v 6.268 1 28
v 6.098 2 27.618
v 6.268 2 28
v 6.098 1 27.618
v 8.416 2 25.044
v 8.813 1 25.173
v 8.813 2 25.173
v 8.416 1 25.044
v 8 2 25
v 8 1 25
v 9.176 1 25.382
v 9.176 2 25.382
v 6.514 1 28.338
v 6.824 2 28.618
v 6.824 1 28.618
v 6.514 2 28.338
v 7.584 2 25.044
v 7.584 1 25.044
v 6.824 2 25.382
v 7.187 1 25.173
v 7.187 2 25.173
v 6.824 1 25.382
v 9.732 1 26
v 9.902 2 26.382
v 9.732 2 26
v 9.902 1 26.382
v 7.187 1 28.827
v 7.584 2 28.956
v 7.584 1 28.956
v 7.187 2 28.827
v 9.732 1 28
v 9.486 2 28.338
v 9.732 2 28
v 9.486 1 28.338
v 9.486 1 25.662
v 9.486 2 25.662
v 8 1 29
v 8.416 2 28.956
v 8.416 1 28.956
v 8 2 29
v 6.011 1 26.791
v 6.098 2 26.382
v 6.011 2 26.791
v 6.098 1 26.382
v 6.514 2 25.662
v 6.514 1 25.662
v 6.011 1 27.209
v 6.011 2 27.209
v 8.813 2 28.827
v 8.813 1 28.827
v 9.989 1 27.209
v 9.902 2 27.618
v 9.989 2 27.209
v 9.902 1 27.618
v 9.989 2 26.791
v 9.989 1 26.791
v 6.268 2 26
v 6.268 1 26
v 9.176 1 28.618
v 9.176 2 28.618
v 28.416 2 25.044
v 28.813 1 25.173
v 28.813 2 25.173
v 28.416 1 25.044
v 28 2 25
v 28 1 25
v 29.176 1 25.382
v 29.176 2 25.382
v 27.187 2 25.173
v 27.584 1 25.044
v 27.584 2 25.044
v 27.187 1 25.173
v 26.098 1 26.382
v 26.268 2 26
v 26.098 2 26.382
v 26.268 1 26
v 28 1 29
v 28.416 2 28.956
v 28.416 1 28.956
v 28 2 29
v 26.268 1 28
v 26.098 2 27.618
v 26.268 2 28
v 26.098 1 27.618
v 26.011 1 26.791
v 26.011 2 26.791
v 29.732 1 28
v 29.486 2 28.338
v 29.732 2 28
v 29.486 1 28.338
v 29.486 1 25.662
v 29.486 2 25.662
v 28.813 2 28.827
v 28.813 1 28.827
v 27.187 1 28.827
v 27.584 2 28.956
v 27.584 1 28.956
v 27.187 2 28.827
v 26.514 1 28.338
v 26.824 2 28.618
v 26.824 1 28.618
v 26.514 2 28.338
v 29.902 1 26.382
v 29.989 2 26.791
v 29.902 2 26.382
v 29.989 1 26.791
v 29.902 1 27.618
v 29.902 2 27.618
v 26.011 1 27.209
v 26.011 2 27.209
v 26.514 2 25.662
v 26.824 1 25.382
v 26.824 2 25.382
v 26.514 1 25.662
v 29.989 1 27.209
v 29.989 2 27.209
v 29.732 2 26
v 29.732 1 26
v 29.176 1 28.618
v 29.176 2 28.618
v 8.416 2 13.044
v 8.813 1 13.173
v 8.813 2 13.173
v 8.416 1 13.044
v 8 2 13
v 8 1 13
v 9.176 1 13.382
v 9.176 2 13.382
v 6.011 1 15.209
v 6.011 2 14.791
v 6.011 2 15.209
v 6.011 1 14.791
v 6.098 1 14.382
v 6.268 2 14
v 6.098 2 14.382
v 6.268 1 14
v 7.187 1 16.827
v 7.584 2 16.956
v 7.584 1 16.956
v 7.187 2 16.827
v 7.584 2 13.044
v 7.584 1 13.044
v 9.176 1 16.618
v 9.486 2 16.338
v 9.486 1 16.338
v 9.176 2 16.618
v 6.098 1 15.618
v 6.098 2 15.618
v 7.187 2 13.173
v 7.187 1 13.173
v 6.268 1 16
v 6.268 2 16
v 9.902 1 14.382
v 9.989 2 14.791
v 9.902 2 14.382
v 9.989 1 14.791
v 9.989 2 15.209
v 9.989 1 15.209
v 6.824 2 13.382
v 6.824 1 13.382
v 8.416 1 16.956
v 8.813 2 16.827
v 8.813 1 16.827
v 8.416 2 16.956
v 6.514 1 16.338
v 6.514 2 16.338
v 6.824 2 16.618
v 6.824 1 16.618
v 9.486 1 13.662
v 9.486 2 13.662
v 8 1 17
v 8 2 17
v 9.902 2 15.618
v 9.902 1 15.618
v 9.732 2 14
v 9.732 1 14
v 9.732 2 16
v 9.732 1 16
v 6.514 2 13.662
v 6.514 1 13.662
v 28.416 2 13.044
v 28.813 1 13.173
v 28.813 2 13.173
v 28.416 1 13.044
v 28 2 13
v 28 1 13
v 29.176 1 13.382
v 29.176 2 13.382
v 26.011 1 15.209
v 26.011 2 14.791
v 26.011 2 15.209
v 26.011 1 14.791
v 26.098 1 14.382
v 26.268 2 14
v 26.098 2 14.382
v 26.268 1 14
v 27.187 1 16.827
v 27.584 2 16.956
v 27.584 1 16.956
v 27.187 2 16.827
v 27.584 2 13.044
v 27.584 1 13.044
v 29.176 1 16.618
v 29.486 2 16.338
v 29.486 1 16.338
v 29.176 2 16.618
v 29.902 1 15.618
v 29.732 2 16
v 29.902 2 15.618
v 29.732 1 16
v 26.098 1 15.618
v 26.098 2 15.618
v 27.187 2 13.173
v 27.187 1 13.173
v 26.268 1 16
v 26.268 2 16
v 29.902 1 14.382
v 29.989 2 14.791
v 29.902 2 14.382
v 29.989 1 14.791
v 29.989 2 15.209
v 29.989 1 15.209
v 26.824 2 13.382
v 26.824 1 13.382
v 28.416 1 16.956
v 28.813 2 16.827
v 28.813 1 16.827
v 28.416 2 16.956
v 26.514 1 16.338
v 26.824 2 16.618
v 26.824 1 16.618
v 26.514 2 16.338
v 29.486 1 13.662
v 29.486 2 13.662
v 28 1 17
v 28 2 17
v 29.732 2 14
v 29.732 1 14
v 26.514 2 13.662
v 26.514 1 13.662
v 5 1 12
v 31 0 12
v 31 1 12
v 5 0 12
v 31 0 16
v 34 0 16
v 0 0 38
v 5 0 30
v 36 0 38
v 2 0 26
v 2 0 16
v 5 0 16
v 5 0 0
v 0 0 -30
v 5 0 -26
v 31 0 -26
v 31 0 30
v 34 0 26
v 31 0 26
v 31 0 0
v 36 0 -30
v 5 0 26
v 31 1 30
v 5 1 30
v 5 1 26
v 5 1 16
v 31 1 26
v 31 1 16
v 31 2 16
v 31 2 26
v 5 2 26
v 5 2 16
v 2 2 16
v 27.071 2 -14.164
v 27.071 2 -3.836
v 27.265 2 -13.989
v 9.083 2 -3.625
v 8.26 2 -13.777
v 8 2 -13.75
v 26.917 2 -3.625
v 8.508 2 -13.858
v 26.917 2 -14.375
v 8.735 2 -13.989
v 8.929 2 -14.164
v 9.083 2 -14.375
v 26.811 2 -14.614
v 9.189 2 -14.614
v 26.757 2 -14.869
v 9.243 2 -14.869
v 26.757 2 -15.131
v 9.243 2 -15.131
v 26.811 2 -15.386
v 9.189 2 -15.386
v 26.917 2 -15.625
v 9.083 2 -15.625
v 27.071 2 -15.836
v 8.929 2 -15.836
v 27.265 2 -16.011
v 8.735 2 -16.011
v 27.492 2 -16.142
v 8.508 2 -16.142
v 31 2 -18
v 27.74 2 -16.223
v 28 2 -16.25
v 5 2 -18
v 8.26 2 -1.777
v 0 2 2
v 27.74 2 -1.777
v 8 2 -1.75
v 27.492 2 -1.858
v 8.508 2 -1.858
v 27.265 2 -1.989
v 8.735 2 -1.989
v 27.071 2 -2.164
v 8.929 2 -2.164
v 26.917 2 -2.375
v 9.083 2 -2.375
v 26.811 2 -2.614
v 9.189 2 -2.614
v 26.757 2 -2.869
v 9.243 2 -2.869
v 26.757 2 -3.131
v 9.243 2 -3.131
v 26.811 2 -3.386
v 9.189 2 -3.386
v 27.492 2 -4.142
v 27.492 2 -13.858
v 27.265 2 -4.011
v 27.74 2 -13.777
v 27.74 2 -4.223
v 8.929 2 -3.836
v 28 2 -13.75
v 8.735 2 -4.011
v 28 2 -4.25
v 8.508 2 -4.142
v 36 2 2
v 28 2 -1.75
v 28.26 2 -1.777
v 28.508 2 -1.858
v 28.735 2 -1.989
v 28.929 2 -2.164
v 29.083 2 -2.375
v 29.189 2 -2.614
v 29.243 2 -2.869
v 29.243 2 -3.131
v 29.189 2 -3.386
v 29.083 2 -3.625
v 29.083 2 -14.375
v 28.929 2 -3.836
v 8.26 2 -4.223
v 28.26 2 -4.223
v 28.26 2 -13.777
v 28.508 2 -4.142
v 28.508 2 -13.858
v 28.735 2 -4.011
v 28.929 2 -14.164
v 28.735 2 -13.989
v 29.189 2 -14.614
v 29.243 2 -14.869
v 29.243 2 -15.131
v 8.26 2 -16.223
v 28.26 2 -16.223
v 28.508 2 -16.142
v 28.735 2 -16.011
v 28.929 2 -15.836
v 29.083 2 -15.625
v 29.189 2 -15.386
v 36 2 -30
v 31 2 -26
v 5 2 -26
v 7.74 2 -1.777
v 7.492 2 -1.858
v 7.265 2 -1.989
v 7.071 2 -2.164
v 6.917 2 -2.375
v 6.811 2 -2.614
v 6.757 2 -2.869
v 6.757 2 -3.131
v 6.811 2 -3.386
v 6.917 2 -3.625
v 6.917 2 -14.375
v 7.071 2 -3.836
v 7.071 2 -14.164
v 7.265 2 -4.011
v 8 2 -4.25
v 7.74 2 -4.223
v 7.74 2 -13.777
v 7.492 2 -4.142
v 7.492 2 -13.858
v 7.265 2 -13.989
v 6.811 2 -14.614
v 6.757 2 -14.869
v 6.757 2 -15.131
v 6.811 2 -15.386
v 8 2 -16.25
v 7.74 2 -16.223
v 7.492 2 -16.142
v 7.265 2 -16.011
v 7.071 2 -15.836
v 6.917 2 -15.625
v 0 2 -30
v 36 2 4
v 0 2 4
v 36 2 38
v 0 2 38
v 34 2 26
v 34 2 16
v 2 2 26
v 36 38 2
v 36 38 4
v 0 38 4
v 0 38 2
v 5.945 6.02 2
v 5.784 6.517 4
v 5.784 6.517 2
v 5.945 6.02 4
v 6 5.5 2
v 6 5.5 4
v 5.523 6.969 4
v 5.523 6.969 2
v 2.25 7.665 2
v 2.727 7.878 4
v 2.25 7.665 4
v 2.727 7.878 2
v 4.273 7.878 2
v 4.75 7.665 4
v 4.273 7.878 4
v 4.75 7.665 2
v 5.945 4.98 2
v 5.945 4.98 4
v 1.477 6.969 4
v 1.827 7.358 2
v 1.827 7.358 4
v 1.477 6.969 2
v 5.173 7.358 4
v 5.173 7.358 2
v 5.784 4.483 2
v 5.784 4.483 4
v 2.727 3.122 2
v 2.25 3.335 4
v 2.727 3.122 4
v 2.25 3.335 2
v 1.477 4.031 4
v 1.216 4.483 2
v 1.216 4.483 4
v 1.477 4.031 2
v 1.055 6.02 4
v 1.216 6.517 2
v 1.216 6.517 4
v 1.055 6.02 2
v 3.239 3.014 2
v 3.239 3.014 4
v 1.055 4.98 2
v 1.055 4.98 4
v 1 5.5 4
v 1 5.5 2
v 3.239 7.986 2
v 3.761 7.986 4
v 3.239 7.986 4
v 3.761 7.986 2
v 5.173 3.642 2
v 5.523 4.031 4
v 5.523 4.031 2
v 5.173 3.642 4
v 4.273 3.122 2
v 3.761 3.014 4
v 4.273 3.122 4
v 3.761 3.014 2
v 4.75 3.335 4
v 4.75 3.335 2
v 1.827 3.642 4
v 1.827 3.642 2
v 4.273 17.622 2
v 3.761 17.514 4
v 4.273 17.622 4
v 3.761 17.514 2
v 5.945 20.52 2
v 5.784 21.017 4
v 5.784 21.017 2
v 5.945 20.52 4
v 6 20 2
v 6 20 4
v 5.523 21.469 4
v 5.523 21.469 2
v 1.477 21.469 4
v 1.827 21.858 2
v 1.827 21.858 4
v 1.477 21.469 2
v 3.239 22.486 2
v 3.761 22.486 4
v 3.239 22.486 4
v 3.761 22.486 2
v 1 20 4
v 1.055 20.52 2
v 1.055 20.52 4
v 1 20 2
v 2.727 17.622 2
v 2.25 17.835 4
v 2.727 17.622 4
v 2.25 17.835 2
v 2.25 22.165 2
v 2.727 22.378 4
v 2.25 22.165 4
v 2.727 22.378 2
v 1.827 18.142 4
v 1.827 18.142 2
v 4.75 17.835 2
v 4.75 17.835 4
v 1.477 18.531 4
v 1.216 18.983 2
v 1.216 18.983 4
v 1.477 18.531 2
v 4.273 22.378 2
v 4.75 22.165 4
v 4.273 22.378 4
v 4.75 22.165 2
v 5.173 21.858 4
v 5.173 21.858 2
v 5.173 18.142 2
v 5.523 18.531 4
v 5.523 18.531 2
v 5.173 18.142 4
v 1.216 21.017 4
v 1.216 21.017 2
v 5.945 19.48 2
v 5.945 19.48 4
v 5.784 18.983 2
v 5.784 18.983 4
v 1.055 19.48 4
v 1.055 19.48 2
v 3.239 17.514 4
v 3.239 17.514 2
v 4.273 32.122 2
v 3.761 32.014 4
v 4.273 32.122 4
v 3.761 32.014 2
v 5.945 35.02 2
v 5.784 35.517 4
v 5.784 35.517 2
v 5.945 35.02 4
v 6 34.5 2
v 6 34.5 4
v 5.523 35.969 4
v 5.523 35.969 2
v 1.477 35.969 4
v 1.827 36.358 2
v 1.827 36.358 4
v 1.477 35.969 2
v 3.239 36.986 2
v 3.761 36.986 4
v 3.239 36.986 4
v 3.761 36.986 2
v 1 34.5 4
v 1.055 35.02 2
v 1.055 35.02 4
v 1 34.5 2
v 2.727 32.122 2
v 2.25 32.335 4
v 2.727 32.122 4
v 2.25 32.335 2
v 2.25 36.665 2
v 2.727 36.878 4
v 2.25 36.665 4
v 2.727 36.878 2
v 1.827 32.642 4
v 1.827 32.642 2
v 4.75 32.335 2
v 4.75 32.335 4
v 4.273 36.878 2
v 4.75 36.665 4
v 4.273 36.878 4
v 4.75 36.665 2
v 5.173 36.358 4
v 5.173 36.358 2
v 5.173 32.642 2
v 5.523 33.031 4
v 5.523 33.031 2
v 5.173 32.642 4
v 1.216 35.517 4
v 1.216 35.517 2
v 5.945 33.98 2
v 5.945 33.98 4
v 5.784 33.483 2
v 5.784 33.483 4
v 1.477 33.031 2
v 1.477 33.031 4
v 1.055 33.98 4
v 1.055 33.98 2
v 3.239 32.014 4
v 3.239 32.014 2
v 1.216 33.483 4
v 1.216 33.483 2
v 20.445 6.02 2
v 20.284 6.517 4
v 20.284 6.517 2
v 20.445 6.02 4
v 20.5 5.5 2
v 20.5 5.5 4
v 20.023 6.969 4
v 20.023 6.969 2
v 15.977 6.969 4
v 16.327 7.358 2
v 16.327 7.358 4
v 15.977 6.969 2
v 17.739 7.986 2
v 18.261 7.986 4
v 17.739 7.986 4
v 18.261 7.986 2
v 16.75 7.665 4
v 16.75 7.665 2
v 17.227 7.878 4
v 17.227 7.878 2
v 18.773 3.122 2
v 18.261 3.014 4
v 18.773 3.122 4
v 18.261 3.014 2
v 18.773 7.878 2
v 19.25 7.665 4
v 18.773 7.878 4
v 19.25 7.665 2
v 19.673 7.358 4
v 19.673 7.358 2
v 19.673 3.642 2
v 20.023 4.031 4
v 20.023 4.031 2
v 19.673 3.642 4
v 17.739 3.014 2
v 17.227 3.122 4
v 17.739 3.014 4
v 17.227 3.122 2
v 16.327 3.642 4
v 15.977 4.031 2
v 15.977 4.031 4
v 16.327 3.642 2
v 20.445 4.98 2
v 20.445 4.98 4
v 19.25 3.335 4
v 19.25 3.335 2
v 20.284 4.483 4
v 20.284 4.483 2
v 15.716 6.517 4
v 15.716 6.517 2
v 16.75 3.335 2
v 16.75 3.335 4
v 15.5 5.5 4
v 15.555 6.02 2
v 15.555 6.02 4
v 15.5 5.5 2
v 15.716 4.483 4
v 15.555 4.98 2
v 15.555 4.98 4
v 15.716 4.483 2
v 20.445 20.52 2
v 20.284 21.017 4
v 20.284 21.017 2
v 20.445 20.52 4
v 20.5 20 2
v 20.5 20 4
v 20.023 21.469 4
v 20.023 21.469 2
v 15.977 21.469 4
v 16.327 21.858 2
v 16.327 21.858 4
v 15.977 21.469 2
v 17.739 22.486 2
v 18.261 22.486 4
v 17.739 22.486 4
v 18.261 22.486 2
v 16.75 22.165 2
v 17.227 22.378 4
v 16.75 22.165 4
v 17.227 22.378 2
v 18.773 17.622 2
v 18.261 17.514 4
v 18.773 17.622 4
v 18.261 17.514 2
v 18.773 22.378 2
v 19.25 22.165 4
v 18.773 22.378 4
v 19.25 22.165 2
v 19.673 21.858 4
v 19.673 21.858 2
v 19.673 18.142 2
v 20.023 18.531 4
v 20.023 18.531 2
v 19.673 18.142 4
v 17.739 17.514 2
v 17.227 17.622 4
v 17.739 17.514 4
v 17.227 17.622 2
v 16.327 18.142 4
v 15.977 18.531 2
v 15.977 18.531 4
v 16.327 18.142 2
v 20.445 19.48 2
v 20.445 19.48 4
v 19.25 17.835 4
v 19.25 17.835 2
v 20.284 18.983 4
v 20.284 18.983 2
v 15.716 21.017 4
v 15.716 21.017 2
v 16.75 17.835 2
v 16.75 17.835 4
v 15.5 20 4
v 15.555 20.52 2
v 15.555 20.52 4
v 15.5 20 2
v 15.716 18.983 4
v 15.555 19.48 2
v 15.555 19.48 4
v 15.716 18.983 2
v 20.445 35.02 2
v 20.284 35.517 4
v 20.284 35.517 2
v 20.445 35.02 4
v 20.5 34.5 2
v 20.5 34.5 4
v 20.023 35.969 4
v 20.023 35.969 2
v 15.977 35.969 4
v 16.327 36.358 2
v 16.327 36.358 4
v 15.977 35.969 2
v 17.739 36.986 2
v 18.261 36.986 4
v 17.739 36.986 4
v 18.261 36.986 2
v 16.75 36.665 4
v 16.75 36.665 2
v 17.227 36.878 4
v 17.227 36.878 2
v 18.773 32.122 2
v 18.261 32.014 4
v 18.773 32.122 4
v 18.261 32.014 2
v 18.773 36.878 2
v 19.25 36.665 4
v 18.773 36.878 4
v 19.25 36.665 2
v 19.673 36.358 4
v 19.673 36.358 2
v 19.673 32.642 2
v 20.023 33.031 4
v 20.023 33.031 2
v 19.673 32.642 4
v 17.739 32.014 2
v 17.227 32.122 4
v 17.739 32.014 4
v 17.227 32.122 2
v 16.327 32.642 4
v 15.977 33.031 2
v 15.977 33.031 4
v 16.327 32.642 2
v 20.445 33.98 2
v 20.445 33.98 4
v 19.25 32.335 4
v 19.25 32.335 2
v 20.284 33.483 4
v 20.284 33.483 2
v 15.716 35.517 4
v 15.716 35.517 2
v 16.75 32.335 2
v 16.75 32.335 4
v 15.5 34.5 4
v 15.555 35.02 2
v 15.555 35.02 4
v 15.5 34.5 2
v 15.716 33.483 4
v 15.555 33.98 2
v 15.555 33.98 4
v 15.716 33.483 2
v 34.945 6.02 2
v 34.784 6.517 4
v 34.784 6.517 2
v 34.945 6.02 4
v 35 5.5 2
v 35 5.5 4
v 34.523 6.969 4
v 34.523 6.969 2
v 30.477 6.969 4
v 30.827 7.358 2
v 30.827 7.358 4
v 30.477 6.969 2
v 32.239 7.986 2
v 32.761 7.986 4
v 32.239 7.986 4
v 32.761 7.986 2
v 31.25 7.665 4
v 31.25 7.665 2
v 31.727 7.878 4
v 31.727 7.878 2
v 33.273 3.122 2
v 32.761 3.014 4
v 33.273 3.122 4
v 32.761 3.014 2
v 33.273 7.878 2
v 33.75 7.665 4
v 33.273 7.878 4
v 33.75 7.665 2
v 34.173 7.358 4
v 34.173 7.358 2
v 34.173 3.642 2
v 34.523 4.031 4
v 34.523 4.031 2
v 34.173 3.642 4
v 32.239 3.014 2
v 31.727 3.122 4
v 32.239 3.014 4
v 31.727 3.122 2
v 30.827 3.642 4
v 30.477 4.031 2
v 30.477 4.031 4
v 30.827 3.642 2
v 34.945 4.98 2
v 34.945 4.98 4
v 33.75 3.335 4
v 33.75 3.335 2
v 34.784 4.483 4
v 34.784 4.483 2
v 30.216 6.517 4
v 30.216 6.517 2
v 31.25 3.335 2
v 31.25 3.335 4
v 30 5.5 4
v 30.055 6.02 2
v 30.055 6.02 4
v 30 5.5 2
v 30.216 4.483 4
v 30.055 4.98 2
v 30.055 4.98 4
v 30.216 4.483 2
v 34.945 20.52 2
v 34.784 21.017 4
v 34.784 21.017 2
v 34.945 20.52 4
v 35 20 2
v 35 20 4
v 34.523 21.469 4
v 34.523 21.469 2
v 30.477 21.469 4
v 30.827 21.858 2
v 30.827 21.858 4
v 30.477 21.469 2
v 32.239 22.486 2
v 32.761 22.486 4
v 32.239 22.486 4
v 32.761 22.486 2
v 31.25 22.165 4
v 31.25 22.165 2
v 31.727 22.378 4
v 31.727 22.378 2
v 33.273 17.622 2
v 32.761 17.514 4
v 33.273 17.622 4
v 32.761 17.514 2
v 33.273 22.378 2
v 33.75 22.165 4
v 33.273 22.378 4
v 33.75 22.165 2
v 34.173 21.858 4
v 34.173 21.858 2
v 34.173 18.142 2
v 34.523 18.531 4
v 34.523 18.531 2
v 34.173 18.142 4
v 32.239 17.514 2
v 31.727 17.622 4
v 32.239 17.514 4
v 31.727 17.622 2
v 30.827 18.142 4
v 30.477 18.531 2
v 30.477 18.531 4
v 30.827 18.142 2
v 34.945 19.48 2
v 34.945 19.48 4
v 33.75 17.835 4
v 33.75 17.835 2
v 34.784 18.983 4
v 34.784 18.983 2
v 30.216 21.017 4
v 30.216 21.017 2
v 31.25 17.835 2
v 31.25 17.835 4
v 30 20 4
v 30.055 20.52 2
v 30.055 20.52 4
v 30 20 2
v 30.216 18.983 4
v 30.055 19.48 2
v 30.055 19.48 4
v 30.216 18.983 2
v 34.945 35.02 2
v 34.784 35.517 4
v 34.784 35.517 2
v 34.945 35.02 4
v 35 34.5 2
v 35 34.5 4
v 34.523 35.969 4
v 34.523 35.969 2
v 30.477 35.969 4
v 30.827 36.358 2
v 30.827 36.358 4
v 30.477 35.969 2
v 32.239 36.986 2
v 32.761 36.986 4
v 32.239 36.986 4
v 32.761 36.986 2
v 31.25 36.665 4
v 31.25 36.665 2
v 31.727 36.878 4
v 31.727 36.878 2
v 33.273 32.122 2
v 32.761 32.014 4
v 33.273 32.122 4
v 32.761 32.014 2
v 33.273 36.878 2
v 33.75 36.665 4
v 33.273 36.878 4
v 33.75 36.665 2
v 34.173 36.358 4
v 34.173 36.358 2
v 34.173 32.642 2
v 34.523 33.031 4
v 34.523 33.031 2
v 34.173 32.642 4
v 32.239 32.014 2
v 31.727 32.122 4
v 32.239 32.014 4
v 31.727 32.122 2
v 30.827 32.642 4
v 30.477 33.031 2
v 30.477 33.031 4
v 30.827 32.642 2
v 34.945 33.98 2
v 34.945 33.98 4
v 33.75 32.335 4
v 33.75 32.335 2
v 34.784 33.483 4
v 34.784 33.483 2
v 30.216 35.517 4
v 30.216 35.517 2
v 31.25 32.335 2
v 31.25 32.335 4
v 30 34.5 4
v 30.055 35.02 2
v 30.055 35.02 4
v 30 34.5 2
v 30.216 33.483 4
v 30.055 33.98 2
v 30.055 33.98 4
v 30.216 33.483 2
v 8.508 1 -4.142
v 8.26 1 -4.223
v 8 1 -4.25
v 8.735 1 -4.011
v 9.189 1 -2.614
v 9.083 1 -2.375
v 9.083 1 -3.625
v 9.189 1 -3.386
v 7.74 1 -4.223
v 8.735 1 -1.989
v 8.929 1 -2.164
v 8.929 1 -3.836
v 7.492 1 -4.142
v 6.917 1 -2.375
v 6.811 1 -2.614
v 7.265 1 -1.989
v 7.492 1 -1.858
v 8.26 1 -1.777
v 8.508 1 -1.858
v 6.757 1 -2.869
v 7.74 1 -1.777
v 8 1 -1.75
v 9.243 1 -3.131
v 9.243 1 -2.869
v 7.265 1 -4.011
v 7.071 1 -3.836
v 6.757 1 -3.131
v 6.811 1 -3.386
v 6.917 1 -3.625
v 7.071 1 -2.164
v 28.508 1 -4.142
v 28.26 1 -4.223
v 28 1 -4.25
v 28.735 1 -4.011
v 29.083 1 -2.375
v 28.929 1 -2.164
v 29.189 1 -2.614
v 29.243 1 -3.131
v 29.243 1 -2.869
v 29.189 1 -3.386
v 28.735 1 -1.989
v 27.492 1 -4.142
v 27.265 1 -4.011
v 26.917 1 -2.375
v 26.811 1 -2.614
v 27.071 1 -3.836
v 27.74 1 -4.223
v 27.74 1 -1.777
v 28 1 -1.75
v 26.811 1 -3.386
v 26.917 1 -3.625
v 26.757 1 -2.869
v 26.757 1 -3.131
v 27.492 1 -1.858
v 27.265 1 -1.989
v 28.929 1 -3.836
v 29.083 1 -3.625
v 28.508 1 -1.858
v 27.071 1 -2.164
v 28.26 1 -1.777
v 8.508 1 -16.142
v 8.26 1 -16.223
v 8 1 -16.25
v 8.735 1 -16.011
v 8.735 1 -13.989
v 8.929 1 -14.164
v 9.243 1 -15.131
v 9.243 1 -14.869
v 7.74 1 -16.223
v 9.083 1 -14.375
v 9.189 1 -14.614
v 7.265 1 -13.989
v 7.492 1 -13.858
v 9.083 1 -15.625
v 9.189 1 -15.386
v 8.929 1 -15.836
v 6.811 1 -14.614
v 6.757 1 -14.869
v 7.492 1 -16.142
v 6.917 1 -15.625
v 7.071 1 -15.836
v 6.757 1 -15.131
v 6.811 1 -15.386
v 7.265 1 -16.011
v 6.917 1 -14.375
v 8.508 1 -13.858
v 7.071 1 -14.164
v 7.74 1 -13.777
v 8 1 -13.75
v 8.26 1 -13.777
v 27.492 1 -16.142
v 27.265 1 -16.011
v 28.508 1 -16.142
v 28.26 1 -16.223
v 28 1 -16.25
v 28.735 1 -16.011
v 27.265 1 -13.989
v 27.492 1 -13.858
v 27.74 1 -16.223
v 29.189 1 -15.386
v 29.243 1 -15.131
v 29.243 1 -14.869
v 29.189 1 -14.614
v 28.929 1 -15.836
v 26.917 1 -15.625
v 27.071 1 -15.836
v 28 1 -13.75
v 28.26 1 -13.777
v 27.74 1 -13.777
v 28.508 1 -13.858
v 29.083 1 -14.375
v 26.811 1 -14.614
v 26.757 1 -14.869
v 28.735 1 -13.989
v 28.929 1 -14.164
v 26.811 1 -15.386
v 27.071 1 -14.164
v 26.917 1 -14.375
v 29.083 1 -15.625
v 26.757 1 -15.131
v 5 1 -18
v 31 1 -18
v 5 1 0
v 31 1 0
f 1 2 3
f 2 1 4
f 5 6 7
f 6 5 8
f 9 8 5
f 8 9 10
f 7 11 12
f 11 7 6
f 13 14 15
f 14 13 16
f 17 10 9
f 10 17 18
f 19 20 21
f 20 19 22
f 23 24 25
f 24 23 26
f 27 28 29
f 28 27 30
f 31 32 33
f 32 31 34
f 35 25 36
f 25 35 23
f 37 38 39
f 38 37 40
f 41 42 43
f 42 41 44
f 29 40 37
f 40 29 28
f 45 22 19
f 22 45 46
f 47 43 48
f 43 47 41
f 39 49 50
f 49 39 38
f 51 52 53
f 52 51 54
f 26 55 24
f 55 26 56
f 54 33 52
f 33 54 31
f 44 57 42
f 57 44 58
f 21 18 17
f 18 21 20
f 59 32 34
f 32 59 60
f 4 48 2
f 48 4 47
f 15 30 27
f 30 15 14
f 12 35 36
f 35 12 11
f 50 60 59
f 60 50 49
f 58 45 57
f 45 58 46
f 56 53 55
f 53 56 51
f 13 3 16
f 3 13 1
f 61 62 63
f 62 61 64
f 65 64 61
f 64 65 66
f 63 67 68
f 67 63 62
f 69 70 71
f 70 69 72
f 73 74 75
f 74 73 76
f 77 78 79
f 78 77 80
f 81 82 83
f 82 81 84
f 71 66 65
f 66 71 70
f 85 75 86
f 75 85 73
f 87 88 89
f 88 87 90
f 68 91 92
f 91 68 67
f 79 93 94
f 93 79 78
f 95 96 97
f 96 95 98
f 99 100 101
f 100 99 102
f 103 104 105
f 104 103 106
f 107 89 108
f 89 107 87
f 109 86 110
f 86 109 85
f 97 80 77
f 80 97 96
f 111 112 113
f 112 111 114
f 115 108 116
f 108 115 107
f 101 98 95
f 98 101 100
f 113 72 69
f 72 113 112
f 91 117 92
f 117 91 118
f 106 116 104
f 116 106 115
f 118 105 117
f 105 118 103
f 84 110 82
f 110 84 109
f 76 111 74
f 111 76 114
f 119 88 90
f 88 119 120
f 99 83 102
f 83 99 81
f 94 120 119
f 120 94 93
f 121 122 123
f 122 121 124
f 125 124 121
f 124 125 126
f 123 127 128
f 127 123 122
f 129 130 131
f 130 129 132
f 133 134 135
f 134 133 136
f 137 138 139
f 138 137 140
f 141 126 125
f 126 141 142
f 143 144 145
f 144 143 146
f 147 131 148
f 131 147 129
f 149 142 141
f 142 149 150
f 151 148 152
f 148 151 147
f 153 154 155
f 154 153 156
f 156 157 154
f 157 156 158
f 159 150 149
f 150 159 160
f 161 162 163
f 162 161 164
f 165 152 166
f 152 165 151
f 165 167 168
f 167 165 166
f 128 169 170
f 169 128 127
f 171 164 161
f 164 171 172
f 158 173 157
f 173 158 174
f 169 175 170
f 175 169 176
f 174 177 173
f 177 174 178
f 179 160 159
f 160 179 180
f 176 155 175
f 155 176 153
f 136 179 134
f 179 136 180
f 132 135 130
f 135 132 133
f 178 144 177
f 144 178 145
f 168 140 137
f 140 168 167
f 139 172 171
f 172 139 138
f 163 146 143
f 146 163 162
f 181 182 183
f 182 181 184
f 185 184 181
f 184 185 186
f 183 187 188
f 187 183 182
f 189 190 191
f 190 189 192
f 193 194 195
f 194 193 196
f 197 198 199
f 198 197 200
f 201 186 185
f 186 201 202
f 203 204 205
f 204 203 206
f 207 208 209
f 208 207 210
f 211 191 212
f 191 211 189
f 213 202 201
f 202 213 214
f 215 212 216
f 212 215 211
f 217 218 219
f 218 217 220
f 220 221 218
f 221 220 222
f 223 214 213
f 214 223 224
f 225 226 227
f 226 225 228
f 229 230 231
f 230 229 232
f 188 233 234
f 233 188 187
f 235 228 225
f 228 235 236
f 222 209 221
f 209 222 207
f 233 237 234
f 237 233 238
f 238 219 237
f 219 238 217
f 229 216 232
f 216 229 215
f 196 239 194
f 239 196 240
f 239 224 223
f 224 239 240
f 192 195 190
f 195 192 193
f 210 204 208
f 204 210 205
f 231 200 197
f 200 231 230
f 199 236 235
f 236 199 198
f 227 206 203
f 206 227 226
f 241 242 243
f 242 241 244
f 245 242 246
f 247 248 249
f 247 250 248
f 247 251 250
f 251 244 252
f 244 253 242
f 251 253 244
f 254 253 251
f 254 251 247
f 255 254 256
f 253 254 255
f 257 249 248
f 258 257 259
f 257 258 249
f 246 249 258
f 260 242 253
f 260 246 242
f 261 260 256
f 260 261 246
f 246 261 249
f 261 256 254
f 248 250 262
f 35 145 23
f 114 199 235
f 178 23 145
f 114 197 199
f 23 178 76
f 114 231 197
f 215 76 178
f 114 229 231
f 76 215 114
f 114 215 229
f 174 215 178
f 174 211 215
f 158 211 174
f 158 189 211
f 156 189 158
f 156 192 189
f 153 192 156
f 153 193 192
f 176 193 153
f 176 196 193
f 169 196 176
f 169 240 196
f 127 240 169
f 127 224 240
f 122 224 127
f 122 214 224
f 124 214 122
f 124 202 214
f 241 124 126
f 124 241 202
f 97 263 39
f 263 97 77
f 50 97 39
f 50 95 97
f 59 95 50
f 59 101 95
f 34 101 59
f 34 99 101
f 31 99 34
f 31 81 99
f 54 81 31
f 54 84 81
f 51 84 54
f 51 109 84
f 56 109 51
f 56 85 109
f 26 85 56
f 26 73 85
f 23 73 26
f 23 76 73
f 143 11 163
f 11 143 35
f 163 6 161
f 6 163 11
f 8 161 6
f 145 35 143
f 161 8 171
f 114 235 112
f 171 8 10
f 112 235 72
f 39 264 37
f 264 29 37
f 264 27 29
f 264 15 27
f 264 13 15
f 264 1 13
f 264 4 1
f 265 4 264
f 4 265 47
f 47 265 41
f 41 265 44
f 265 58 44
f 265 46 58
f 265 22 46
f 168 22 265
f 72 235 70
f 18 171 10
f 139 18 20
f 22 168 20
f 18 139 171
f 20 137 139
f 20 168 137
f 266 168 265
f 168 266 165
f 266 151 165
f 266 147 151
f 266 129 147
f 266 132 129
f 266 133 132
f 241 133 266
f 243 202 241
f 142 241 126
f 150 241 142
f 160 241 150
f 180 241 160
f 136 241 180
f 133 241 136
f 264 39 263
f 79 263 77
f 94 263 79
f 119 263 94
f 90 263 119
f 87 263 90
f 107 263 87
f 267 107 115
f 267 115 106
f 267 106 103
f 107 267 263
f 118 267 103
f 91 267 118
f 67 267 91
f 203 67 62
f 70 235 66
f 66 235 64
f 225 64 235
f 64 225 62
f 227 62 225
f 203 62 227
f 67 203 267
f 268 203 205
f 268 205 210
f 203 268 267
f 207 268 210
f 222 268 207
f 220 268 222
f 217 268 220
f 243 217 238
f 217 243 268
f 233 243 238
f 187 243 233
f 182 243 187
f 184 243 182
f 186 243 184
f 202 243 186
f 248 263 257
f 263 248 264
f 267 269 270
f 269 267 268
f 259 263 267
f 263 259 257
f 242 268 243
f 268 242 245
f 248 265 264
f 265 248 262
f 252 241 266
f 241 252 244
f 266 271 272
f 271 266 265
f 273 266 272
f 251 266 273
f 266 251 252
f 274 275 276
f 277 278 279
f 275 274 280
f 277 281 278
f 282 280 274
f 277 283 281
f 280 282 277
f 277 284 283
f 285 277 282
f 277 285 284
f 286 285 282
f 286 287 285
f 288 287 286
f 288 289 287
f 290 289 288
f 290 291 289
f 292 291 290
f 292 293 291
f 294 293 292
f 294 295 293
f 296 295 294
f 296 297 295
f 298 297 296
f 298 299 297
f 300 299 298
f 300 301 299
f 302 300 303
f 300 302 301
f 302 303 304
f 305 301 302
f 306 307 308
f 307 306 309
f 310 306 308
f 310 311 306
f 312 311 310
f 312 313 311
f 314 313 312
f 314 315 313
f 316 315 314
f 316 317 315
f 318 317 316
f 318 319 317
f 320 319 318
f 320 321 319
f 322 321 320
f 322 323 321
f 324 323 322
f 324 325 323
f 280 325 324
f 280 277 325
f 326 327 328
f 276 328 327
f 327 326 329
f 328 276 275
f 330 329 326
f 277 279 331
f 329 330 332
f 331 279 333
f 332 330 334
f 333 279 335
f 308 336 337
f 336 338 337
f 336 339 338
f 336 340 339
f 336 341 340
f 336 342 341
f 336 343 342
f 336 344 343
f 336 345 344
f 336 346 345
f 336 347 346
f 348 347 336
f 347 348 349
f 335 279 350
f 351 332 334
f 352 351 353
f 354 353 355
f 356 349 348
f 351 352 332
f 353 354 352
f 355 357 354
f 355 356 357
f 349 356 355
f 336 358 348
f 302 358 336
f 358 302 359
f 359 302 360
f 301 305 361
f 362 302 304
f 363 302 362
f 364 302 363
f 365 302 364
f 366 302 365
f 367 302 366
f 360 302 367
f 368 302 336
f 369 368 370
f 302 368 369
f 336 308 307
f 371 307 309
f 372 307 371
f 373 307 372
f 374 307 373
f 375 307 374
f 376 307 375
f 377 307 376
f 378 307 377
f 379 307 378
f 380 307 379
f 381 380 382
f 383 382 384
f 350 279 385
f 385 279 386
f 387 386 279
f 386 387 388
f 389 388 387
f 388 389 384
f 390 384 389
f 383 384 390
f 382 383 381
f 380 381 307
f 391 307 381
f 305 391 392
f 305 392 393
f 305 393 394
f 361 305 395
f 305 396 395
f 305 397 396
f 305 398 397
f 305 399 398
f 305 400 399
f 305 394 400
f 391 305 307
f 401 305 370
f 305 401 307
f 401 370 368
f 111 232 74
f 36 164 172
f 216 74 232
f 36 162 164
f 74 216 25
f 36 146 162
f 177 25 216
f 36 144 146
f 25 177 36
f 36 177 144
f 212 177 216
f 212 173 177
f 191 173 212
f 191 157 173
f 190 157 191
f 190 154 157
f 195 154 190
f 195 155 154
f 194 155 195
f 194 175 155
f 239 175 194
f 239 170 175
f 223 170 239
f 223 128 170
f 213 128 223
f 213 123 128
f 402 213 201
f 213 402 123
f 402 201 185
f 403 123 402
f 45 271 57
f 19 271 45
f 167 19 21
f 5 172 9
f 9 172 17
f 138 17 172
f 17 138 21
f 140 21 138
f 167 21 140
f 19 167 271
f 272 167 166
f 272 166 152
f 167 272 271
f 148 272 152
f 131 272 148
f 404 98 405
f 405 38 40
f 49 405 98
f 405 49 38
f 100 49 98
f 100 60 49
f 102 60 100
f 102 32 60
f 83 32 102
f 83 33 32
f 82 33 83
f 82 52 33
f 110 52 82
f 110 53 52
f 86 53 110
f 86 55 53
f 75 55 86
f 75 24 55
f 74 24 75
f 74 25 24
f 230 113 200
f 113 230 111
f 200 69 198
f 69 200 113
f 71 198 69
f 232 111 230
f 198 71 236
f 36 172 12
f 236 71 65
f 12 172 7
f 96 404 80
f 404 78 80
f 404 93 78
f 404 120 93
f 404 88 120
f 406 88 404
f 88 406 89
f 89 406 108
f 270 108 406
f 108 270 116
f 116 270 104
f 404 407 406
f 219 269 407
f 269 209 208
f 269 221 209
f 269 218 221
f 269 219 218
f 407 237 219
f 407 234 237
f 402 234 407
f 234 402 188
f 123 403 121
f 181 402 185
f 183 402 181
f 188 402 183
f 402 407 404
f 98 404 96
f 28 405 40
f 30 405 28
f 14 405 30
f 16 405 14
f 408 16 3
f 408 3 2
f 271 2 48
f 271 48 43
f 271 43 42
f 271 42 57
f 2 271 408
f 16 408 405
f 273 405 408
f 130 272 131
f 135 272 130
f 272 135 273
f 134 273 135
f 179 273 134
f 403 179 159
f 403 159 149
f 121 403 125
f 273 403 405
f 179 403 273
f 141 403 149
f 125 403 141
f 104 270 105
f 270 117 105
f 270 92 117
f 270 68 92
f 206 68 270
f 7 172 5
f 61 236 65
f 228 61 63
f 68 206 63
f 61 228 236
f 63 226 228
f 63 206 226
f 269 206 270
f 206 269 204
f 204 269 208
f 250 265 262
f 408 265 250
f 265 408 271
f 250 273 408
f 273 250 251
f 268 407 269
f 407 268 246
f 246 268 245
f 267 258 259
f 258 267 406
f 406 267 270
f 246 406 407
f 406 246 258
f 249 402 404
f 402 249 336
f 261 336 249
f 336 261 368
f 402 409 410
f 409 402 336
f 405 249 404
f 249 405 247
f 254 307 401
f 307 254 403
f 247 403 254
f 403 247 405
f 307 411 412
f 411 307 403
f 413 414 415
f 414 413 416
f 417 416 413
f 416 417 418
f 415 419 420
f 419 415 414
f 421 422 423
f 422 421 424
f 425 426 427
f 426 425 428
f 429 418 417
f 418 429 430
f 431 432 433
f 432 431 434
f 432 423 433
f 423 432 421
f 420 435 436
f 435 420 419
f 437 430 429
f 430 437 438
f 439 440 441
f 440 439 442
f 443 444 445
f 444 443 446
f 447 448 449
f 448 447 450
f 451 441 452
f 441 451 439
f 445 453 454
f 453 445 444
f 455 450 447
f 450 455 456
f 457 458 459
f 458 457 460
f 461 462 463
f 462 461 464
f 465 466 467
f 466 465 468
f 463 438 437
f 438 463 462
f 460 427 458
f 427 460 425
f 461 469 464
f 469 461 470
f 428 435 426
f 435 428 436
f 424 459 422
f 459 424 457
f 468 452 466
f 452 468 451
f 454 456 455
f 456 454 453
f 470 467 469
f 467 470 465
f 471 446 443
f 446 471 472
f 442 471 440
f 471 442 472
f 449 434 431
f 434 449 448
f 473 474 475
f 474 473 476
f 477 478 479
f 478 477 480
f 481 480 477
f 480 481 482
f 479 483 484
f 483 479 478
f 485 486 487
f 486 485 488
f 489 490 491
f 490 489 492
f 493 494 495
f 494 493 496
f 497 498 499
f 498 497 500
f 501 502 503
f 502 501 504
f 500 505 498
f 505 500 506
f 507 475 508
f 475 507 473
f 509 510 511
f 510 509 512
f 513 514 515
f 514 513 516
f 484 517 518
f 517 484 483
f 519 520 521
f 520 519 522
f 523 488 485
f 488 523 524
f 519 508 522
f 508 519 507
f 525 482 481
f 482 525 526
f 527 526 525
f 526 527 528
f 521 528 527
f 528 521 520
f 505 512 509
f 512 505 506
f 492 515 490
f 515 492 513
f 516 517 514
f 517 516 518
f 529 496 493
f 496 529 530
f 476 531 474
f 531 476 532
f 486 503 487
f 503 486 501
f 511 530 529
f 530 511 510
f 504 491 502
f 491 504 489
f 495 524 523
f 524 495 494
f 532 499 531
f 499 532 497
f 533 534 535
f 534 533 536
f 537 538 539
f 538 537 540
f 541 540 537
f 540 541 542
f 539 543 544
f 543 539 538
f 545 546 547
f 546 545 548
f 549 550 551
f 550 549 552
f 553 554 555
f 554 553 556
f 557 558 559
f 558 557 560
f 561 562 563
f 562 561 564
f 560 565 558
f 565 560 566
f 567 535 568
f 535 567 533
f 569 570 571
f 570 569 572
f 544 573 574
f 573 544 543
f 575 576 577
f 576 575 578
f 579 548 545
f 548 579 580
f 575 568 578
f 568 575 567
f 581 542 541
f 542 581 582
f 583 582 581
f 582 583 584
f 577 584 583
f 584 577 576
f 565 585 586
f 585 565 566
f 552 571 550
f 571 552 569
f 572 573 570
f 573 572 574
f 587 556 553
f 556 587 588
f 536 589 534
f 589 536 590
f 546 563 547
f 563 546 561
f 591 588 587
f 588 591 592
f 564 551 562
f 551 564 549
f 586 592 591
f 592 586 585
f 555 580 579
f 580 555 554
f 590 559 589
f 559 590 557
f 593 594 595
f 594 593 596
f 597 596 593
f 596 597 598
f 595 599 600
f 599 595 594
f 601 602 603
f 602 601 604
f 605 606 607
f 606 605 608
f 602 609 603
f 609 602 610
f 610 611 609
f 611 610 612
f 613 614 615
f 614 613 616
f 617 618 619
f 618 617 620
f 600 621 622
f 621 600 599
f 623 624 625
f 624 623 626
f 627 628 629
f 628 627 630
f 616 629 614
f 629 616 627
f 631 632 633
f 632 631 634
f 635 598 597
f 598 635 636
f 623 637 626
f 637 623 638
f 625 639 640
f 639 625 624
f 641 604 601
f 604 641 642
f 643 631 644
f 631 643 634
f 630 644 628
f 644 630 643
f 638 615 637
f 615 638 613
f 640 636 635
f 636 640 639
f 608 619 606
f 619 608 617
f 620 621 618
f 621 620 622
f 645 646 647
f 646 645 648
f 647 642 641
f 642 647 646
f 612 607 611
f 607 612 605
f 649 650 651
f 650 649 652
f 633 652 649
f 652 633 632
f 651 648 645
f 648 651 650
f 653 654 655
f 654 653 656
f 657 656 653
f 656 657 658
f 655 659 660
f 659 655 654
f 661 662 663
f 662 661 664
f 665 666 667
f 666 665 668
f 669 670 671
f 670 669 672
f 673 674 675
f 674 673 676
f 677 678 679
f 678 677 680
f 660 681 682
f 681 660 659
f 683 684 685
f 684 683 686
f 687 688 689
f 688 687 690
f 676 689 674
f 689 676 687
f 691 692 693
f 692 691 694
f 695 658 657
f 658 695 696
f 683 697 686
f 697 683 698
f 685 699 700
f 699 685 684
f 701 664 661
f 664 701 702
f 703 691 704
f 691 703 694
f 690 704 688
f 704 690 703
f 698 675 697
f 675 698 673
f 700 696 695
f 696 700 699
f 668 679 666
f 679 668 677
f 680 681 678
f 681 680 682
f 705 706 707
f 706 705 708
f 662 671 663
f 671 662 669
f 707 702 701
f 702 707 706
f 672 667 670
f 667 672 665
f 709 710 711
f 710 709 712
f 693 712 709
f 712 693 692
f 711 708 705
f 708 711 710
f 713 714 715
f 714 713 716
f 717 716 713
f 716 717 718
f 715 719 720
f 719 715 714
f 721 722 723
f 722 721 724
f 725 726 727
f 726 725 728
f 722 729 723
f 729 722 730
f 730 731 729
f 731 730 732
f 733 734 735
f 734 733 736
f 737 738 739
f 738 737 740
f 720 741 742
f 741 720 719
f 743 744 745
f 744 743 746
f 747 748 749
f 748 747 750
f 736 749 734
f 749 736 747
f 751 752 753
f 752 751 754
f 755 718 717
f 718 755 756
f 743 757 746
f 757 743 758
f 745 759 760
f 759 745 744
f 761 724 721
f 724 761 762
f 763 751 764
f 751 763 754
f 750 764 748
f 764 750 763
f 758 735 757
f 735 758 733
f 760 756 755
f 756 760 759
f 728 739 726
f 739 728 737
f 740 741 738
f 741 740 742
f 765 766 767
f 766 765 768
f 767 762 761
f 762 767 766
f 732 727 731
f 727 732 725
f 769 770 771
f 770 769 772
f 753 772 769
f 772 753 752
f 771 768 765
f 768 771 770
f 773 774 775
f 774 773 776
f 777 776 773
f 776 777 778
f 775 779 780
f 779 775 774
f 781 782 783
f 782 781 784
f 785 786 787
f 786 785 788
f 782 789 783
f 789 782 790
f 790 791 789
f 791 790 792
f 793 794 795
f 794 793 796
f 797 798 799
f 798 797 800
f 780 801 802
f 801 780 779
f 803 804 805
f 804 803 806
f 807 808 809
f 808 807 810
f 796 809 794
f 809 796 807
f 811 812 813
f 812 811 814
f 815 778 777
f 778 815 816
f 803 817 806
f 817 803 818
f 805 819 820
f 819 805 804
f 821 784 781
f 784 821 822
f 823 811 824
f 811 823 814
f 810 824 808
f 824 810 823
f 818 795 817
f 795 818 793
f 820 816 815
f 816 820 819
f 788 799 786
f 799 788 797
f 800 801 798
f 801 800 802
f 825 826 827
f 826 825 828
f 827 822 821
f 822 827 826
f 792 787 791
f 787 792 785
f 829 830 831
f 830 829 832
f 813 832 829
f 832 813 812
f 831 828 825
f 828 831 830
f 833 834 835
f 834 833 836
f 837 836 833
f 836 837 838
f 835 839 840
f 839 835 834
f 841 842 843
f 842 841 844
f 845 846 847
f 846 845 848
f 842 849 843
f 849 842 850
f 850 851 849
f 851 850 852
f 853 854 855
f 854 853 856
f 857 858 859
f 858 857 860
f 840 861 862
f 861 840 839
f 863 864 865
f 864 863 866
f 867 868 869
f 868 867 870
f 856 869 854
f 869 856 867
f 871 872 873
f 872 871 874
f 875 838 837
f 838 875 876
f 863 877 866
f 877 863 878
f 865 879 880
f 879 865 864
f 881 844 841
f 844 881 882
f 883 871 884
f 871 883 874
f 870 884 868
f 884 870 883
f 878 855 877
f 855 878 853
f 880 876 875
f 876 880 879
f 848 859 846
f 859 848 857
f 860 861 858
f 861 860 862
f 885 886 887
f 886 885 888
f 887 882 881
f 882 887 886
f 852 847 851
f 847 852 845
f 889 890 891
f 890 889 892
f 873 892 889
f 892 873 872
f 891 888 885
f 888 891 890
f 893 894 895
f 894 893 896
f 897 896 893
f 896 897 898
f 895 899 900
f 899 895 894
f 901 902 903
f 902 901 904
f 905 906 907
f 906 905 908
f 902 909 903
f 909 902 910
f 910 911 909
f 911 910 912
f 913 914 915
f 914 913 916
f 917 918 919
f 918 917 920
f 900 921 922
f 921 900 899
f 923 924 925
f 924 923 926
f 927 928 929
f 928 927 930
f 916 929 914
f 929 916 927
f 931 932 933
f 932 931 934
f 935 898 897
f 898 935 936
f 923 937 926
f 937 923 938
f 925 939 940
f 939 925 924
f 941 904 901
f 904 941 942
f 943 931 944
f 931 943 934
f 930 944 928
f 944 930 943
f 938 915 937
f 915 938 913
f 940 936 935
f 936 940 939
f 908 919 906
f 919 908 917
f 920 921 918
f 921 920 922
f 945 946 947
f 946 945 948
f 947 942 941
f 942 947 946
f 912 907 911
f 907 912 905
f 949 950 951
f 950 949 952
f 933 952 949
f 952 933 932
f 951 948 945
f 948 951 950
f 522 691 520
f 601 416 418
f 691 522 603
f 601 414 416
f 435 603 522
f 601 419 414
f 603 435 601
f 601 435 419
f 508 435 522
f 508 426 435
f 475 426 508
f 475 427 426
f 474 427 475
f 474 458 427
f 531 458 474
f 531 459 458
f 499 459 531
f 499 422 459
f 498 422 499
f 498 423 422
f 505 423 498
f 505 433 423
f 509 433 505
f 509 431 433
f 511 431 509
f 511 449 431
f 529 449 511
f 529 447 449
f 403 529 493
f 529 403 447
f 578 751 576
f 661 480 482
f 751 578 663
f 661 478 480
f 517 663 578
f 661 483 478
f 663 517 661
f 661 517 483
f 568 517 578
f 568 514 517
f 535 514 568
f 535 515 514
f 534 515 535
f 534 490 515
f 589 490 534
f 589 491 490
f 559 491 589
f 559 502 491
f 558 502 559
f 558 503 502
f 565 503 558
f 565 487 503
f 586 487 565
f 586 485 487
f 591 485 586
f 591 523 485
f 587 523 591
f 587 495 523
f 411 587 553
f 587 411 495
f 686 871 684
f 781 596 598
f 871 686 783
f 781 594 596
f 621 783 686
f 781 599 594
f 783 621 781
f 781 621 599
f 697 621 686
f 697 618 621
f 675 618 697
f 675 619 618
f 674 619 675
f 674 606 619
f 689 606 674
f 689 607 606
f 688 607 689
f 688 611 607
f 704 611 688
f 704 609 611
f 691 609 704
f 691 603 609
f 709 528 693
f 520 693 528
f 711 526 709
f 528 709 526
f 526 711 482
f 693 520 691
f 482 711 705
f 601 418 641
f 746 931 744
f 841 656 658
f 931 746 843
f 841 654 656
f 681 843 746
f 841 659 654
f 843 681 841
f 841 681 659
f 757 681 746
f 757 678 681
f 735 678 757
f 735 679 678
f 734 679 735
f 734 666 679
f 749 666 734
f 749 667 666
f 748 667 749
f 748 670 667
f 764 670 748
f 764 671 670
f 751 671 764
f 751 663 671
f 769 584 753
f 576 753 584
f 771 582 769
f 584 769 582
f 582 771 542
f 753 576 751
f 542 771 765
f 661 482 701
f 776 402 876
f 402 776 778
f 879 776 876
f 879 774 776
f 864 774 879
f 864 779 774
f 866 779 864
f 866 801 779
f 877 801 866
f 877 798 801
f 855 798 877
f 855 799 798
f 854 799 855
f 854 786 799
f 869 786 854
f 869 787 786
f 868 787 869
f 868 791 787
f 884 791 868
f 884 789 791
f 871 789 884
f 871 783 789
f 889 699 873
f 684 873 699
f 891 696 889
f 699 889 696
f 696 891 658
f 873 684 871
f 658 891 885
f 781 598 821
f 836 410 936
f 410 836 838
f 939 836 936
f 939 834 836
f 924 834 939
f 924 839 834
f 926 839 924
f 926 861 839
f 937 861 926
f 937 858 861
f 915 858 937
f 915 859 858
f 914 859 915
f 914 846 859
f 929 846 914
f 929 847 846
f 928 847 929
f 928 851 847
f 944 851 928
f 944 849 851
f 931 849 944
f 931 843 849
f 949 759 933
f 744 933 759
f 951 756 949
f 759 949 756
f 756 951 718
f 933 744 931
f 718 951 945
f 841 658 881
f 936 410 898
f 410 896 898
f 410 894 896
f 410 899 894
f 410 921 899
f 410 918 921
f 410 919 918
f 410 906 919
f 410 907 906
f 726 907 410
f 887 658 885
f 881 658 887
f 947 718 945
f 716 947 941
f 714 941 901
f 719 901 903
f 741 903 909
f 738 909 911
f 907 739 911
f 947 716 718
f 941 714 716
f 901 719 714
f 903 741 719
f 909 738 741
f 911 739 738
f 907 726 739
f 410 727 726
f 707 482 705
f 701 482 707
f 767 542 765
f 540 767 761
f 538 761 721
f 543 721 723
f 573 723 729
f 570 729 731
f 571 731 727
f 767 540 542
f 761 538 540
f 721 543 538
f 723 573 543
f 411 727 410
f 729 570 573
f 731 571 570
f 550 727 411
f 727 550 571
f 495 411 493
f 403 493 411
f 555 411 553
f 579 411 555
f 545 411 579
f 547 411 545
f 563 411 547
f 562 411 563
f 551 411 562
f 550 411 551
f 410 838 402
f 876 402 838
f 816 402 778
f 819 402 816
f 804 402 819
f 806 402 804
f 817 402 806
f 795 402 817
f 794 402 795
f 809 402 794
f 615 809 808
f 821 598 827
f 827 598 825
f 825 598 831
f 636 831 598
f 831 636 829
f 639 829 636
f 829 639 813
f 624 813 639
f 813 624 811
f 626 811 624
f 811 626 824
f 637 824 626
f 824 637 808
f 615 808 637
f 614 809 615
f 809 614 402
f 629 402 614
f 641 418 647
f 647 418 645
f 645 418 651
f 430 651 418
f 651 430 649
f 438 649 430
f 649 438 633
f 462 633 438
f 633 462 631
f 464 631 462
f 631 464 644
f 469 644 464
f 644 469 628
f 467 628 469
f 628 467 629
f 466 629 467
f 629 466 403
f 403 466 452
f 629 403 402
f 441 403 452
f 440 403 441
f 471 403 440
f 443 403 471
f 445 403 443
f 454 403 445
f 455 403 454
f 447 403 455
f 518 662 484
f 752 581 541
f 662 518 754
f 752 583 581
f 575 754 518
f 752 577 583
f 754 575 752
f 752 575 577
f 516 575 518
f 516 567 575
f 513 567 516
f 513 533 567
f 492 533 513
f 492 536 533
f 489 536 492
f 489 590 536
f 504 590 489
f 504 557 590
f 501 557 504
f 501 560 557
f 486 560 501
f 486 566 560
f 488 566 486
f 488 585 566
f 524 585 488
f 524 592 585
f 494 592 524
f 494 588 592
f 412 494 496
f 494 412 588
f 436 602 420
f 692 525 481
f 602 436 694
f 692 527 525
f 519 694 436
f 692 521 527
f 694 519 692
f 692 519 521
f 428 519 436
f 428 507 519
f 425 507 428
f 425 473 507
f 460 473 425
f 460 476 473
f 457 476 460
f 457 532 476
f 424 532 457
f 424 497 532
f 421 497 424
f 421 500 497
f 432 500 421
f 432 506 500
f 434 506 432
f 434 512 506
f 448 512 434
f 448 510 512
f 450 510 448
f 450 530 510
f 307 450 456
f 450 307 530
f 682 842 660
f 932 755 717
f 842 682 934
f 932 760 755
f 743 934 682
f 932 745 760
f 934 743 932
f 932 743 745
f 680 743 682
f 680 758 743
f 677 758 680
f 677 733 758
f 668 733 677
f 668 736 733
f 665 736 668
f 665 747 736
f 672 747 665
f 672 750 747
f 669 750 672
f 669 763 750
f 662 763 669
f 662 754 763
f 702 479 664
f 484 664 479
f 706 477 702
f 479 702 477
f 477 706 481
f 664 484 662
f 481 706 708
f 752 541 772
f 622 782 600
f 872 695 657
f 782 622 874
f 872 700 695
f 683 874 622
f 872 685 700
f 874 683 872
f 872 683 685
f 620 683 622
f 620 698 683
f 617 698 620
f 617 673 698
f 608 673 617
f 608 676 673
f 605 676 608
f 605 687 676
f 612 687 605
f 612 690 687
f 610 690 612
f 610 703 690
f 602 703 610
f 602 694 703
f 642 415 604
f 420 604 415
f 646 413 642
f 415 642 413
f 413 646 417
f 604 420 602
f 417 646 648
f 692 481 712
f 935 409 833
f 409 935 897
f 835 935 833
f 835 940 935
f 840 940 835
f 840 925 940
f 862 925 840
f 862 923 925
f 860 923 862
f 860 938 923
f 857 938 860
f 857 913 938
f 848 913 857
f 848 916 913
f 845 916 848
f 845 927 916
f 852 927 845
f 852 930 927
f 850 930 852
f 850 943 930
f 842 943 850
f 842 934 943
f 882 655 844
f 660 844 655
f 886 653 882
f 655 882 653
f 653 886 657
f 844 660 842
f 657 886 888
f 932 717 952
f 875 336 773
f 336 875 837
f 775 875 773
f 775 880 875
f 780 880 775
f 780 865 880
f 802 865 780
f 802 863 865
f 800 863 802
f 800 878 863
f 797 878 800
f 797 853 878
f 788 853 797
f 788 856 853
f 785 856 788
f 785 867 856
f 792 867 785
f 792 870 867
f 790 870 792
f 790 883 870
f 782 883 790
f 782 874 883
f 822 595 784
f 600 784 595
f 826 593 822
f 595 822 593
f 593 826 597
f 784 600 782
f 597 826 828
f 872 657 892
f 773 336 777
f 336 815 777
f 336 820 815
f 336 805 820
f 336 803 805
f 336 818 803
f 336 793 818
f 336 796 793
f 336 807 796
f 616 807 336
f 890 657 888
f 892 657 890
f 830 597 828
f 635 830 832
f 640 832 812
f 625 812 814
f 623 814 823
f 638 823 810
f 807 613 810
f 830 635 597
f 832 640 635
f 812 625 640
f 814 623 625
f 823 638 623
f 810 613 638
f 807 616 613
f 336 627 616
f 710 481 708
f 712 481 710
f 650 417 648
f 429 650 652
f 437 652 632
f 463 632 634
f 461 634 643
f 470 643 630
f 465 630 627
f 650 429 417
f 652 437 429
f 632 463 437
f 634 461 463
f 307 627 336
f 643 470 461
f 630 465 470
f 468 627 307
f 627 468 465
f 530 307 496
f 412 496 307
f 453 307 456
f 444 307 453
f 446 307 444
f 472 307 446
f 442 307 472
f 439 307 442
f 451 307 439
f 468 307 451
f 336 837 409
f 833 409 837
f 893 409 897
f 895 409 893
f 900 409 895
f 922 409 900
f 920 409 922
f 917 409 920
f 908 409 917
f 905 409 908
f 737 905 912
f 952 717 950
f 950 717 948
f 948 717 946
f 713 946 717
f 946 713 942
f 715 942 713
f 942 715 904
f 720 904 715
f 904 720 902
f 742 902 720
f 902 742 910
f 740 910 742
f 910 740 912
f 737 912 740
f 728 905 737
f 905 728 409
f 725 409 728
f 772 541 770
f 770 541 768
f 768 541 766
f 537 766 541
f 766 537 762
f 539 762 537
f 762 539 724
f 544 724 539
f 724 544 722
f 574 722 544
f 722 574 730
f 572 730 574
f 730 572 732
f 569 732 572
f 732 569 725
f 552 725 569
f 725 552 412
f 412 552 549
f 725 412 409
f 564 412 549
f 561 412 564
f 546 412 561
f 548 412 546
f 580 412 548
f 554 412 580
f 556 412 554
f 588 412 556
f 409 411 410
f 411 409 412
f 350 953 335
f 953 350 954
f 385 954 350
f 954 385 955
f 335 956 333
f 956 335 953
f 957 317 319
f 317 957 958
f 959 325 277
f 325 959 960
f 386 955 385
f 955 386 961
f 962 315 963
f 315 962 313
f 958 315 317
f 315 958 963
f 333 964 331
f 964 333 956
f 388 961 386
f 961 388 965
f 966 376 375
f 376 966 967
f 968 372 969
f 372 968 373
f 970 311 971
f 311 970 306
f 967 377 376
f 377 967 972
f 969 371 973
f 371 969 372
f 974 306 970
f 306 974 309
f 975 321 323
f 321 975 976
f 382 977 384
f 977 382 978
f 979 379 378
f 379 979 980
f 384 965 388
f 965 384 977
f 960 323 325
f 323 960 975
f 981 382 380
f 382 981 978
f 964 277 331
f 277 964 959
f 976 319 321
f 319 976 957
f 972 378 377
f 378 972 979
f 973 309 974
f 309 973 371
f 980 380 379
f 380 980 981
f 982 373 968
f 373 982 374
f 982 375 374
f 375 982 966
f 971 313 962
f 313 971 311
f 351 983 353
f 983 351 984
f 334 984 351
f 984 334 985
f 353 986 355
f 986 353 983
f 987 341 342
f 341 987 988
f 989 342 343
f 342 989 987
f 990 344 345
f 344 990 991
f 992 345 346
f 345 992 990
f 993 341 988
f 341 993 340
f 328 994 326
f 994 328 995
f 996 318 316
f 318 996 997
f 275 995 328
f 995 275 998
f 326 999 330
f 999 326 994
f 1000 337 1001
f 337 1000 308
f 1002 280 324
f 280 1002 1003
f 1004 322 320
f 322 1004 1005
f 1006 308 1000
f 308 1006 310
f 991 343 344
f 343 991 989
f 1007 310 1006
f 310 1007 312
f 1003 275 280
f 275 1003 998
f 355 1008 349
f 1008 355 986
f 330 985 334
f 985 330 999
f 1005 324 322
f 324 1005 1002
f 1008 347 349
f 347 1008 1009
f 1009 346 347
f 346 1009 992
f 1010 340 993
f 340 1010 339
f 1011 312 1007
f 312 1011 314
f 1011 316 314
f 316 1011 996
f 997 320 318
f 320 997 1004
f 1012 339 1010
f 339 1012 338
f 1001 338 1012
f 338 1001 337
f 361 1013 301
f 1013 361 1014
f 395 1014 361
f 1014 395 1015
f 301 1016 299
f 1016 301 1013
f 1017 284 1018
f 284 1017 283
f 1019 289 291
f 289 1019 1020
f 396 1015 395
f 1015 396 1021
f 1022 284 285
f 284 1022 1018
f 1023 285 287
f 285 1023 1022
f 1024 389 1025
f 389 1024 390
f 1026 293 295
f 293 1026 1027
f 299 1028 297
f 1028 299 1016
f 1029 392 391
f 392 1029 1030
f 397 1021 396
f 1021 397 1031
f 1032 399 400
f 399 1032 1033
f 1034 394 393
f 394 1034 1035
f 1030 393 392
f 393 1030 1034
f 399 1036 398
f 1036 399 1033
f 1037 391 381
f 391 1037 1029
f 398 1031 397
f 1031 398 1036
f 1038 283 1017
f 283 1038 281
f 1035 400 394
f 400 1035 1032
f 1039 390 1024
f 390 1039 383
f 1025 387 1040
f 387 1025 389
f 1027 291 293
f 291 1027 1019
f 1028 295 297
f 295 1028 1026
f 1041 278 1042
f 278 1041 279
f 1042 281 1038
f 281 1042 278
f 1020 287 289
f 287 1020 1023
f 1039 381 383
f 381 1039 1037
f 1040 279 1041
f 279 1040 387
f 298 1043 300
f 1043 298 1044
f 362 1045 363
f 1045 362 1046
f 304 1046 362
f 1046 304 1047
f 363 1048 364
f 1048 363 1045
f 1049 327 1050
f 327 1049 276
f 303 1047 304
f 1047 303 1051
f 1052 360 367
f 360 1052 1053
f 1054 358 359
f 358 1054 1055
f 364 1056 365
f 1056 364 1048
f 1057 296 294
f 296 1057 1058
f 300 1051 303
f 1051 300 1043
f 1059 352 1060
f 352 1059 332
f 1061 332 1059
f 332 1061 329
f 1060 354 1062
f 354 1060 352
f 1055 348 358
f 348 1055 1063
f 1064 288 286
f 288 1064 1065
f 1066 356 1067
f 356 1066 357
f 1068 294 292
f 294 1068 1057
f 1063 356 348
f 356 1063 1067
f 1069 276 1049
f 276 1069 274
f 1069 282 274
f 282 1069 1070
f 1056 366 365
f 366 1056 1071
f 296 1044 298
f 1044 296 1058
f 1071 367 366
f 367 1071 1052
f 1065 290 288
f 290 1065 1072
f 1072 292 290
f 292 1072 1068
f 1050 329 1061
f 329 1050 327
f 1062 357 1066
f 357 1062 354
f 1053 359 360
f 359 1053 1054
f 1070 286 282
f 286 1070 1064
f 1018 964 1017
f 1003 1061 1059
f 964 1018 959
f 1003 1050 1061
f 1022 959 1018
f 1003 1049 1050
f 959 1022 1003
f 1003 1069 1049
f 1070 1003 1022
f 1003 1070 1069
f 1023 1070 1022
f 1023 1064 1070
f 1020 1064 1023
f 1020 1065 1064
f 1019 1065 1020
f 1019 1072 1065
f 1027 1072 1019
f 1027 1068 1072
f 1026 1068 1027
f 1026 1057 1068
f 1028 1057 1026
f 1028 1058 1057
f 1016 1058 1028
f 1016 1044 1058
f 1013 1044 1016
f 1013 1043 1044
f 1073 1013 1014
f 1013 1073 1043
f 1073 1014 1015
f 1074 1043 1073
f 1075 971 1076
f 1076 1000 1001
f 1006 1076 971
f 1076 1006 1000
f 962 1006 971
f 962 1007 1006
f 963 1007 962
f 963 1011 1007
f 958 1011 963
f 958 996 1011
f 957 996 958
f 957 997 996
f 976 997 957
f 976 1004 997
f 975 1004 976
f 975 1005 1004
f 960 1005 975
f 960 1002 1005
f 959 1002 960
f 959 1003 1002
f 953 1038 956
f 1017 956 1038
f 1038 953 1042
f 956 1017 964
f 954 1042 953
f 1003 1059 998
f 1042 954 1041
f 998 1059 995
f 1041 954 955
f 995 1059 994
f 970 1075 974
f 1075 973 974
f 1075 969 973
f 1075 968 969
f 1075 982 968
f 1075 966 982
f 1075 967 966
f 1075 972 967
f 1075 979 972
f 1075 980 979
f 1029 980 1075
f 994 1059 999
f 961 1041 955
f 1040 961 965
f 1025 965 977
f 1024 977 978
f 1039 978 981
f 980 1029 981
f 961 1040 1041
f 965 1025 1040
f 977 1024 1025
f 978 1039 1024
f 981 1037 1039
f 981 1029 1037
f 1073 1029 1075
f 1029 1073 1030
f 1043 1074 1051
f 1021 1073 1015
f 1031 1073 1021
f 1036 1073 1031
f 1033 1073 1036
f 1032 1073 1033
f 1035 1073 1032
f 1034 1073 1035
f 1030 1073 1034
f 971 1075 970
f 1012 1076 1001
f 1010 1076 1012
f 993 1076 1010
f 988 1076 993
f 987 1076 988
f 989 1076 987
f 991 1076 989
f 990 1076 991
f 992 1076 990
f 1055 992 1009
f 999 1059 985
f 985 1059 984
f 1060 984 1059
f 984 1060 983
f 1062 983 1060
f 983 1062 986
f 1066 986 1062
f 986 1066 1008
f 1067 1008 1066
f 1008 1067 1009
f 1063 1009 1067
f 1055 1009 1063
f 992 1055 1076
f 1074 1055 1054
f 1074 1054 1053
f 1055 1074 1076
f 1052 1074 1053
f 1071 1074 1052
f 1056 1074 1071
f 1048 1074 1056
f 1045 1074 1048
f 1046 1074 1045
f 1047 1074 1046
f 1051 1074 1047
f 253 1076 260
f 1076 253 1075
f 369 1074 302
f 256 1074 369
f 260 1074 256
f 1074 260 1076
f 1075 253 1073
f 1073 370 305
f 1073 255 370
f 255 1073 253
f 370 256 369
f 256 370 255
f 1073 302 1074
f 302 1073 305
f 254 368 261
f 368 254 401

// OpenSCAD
$fn = 30;
CYLINDER_X = 6.1;
CYLINDER_Y = 6;
CYLINDER_Z = 25;
BASE_WIDTH = 70.25;
BASE_LENGTH = 62;
PICASE_X = 45.5;
PICASE_Y = 31;
PICASE_Z = 6;

COLOR_WIDTH = 22;

TOF_LEN = 26;
TOF_WIDTH = 18;

module cylinders2(h, r1, r2, LEN, WIDTH) {
     for (i = [0:WIDTH:WIDTH]){
         for (n = [0:LEN:LEN]){
             translate([i,n,0])cylinder(h, r1, r2);
         }
     }    
} 

module cylinders3(h, r1, r2, LEN, WIDTH, xNum, yNum) {
     for (i = [0:WIDTH/(xNum-1):WIDTH]){
         for (n = [0:LEN/(yNum-1):LEN]){
             translate([i,n,0])cylinder(h, r1, r2);
         }
     }    
} 

module tof(LEN, WIDTH, radius){
        translate([0,0,2]) cube([WIDTH, LEN, 1]);
        translate([radius+1,radius+1,0]) cylinders2(6, 2, 2, LEN-(radius+1)*2,WIDTH-(radius+1)*2);
        translate([WIDTH/2-10/2,-3,1]) cube([10,3,4]);
        translate([WIDTH/2-10/2,LEN,1]) cube([10,3,4]);
}

module camera(LEN,WIDTH,radius){
        translate([0,0,2]) cube([WIDTH+6, LEN, 1]);
        translate([radius+2,radius+2,0]) cylinders2(6, 1.25, 1.25, LEN-(radius+2)*2,WIDTH-(radius+2)*2);
        translate([18,0,0]) cube([8,LEN,10]);
       
}

module lPiece(WIDTH,LEN,radius){
    
    difference(){
        translate([0,0,2]) cube([WIDTH,2,LEN]);
        translate([5,3,30]) rotate([90,90,0])tof(TOF_LEN,TOF_WIDTH,2);
    }
    
    difference(){
        translate([0,2,2]) cube([WIDTH,LEN,2]);
        translate([radius+1,radius+1+2,0]) cylinders3(6,radius,radius,LEN-(radius+1)*2,WIDTH-(radius+1)*2,3,3);
    }
    
    difference(){
        translate([0,0,-30]) cube([WIDTH,2,LEN]);
        translate([5,3,0]) rotate([90,90,0]) camera(TOF_LEN,TOF_WIDTH,1);
    }
    //translate([5,3,]) rotate([90,90,0]) camera(TOF_LEN,TOF_WIDTH,1);
}

lPiece(36,36,2.5);
